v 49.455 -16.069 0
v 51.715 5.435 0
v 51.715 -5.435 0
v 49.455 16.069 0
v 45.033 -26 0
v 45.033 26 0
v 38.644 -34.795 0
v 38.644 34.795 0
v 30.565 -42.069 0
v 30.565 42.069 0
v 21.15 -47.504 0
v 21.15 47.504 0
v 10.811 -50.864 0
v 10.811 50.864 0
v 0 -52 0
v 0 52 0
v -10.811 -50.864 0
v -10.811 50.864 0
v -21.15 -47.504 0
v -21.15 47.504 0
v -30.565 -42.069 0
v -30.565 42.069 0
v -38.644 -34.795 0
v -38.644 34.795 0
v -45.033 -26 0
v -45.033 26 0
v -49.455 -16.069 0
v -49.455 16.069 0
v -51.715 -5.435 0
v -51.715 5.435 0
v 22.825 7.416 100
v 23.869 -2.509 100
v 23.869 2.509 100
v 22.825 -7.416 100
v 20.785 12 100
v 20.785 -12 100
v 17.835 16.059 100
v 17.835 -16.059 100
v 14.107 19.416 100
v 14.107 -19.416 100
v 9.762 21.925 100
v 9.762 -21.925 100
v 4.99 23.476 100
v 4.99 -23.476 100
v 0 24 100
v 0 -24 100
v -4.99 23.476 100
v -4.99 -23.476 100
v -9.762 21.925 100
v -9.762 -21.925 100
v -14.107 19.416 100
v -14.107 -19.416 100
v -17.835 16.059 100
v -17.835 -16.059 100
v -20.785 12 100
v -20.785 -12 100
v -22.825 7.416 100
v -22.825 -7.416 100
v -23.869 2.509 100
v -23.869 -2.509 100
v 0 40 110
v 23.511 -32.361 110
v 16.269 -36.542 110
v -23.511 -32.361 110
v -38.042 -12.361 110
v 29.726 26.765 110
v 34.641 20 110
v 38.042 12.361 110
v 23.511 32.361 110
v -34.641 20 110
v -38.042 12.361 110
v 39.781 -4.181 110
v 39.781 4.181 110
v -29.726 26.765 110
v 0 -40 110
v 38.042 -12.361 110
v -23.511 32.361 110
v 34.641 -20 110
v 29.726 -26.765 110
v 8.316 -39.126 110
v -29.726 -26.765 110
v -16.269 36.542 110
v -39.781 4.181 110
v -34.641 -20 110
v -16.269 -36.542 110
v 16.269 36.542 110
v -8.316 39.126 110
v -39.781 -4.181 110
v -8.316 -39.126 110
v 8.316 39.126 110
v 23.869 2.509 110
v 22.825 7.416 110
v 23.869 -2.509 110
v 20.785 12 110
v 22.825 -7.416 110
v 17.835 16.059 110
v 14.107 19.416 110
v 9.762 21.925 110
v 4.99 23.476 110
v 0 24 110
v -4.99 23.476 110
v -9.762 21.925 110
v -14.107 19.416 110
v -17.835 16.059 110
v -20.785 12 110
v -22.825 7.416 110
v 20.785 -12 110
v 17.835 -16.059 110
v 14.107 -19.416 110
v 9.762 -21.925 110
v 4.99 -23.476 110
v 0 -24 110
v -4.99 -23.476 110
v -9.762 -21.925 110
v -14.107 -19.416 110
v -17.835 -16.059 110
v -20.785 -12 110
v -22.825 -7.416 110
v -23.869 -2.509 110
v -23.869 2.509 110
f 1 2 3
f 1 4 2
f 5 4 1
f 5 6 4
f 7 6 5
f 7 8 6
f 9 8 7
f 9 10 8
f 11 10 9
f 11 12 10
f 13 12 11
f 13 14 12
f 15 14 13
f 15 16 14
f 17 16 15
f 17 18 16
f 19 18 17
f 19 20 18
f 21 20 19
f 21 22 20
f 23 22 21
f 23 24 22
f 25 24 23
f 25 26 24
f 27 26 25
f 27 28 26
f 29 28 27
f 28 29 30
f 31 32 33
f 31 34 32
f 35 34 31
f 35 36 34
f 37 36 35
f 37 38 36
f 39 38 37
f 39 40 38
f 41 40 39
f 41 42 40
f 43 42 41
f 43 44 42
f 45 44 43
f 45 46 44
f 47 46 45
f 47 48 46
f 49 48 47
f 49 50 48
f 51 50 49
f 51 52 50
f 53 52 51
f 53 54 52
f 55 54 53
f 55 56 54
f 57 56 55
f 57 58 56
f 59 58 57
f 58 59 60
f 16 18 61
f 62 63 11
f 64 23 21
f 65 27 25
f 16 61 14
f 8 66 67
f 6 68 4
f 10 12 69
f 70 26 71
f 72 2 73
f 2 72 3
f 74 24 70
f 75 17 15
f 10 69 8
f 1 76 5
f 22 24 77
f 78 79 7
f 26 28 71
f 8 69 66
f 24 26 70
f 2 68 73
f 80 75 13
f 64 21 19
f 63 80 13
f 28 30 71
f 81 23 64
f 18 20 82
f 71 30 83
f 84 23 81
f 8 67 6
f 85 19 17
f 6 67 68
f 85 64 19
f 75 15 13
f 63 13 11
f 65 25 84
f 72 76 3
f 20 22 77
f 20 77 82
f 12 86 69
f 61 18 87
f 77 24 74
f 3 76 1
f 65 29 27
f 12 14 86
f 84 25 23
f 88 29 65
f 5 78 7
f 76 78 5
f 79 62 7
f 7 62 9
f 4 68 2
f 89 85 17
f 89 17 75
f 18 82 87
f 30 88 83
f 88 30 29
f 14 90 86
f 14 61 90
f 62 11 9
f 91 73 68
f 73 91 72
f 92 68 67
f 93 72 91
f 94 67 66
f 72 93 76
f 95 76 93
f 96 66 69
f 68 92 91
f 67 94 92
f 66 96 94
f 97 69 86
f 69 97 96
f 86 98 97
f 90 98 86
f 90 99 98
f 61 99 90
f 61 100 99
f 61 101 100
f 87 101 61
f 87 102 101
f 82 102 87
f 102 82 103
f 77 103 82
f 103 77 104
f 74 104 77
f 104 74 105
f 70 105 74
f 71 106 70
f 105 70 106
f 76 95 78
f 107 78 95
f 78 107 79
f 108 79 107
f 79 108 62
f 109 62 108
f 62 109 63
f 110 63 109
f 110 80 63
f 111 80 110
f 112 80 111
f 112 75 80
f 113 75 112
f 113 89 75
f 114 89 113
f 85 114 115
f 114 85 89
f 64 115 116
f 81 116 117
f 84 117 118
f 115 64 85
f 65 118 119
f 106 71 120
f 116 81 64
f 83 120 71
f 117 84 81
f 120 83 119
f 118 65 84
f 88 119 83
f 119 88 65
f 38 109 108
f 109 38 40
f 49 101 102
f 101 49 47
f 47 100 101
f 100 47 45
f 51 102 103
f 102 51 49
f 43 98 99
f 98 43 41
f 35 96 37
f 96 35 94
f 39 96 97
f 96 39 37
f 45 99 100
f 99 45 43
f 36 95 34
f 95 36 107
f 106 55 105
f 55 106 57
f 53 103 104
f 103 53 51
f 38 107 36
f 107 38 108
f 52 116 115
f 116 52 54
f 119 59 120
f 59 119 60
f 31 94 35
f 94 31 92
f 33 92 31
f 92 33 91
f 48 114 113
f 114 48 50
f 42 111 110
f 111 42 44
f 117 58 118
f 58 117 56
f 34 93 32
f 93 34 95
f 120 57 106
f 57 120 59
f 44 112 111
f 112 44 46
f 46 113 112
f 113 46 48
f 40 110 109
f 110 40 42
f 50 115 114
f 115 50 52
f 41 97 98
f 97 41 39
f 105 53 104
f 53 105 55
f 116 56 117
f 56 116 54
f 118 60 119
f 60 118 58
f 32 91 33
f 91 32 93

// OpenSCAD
// --- 寸法設定 ---
outer_diameter = 80; // 外径 (mm)
height = 100;        // 高さ (mm)
wall_thickness = 4;  // 側面肉厚 (mm)
bottom_thickness = 6; // 底面の厚み (mm)

// --- 取っ手の設定 ---
handle_radius = 12; // 取っ手の半径 (mm)
handle_position_offset = 0; // 取っ手の外側からの突出量（ここでは単純にR+handle_radiusで定義）

// --- 計算値 ---
outer_radius = outer_diameter / 2;
inner_radius = outer_radius - wall_thickness;

// 底面の形状を考慮した内部の円の半径 (底厚6mmを考慮)
inner_bottom_radius = inner_radius - bottom_thickness;


// --- 本体 (マグカップ本体) ---

// 1. 外側の円筒 (最も外側のシェル)
cylinder(h = height, r = outer_radius);

// 2. 内側のくり抜き (飲み物が入る空間)
// 底面の厚み6mmを考慮して内側を定義
difference() {
    // 本体全体（外側の形状）
    cylinder(h = height, r = outer_radius);

    // 内部のくり抜き
    // 内径は、外径から側面肉厚と底厚を引いた値で定義される必要があるが、ここでは単純に内側の円筒をくり抜く。
    translate([0, 0, -0.1]) { // Z軸方向に少し下に開始
        cylinder(h = height + 0.2, r = inner_radius);
    }
}


// --- 取っ手 (リング状) の追加 ---

// 取っ手の中心高さ (カップの中心、高さ50mmの位置)
handle_center_z = height / 2;

// 取っ手を配置するための計算
// 取っ手は外側からR=12mm飛び出す。外側の円筒の半径は40mm。
// 取っ手の内側の円（くぼみ）の半径は、外側R=40 - (壁厚+取手の突出量)
handle_inner_radius = outer_radius - wall_thickness - handle_radius;

// 取っ手本体を生成するための計算
rotate([0, 0, 90]) { // Z軸を回転させて円盤として配置
    difference() {
        // 外側のリング部分 (外径40mmから始まる)
        cylinder(h = height + 10, r1 = outer_radius + handle_radius, r2 = outer_radius);

        // 内側の穴（くぼみ）
        cylinder(h = height + 10, r = handle_inner_radius);
    }
}
